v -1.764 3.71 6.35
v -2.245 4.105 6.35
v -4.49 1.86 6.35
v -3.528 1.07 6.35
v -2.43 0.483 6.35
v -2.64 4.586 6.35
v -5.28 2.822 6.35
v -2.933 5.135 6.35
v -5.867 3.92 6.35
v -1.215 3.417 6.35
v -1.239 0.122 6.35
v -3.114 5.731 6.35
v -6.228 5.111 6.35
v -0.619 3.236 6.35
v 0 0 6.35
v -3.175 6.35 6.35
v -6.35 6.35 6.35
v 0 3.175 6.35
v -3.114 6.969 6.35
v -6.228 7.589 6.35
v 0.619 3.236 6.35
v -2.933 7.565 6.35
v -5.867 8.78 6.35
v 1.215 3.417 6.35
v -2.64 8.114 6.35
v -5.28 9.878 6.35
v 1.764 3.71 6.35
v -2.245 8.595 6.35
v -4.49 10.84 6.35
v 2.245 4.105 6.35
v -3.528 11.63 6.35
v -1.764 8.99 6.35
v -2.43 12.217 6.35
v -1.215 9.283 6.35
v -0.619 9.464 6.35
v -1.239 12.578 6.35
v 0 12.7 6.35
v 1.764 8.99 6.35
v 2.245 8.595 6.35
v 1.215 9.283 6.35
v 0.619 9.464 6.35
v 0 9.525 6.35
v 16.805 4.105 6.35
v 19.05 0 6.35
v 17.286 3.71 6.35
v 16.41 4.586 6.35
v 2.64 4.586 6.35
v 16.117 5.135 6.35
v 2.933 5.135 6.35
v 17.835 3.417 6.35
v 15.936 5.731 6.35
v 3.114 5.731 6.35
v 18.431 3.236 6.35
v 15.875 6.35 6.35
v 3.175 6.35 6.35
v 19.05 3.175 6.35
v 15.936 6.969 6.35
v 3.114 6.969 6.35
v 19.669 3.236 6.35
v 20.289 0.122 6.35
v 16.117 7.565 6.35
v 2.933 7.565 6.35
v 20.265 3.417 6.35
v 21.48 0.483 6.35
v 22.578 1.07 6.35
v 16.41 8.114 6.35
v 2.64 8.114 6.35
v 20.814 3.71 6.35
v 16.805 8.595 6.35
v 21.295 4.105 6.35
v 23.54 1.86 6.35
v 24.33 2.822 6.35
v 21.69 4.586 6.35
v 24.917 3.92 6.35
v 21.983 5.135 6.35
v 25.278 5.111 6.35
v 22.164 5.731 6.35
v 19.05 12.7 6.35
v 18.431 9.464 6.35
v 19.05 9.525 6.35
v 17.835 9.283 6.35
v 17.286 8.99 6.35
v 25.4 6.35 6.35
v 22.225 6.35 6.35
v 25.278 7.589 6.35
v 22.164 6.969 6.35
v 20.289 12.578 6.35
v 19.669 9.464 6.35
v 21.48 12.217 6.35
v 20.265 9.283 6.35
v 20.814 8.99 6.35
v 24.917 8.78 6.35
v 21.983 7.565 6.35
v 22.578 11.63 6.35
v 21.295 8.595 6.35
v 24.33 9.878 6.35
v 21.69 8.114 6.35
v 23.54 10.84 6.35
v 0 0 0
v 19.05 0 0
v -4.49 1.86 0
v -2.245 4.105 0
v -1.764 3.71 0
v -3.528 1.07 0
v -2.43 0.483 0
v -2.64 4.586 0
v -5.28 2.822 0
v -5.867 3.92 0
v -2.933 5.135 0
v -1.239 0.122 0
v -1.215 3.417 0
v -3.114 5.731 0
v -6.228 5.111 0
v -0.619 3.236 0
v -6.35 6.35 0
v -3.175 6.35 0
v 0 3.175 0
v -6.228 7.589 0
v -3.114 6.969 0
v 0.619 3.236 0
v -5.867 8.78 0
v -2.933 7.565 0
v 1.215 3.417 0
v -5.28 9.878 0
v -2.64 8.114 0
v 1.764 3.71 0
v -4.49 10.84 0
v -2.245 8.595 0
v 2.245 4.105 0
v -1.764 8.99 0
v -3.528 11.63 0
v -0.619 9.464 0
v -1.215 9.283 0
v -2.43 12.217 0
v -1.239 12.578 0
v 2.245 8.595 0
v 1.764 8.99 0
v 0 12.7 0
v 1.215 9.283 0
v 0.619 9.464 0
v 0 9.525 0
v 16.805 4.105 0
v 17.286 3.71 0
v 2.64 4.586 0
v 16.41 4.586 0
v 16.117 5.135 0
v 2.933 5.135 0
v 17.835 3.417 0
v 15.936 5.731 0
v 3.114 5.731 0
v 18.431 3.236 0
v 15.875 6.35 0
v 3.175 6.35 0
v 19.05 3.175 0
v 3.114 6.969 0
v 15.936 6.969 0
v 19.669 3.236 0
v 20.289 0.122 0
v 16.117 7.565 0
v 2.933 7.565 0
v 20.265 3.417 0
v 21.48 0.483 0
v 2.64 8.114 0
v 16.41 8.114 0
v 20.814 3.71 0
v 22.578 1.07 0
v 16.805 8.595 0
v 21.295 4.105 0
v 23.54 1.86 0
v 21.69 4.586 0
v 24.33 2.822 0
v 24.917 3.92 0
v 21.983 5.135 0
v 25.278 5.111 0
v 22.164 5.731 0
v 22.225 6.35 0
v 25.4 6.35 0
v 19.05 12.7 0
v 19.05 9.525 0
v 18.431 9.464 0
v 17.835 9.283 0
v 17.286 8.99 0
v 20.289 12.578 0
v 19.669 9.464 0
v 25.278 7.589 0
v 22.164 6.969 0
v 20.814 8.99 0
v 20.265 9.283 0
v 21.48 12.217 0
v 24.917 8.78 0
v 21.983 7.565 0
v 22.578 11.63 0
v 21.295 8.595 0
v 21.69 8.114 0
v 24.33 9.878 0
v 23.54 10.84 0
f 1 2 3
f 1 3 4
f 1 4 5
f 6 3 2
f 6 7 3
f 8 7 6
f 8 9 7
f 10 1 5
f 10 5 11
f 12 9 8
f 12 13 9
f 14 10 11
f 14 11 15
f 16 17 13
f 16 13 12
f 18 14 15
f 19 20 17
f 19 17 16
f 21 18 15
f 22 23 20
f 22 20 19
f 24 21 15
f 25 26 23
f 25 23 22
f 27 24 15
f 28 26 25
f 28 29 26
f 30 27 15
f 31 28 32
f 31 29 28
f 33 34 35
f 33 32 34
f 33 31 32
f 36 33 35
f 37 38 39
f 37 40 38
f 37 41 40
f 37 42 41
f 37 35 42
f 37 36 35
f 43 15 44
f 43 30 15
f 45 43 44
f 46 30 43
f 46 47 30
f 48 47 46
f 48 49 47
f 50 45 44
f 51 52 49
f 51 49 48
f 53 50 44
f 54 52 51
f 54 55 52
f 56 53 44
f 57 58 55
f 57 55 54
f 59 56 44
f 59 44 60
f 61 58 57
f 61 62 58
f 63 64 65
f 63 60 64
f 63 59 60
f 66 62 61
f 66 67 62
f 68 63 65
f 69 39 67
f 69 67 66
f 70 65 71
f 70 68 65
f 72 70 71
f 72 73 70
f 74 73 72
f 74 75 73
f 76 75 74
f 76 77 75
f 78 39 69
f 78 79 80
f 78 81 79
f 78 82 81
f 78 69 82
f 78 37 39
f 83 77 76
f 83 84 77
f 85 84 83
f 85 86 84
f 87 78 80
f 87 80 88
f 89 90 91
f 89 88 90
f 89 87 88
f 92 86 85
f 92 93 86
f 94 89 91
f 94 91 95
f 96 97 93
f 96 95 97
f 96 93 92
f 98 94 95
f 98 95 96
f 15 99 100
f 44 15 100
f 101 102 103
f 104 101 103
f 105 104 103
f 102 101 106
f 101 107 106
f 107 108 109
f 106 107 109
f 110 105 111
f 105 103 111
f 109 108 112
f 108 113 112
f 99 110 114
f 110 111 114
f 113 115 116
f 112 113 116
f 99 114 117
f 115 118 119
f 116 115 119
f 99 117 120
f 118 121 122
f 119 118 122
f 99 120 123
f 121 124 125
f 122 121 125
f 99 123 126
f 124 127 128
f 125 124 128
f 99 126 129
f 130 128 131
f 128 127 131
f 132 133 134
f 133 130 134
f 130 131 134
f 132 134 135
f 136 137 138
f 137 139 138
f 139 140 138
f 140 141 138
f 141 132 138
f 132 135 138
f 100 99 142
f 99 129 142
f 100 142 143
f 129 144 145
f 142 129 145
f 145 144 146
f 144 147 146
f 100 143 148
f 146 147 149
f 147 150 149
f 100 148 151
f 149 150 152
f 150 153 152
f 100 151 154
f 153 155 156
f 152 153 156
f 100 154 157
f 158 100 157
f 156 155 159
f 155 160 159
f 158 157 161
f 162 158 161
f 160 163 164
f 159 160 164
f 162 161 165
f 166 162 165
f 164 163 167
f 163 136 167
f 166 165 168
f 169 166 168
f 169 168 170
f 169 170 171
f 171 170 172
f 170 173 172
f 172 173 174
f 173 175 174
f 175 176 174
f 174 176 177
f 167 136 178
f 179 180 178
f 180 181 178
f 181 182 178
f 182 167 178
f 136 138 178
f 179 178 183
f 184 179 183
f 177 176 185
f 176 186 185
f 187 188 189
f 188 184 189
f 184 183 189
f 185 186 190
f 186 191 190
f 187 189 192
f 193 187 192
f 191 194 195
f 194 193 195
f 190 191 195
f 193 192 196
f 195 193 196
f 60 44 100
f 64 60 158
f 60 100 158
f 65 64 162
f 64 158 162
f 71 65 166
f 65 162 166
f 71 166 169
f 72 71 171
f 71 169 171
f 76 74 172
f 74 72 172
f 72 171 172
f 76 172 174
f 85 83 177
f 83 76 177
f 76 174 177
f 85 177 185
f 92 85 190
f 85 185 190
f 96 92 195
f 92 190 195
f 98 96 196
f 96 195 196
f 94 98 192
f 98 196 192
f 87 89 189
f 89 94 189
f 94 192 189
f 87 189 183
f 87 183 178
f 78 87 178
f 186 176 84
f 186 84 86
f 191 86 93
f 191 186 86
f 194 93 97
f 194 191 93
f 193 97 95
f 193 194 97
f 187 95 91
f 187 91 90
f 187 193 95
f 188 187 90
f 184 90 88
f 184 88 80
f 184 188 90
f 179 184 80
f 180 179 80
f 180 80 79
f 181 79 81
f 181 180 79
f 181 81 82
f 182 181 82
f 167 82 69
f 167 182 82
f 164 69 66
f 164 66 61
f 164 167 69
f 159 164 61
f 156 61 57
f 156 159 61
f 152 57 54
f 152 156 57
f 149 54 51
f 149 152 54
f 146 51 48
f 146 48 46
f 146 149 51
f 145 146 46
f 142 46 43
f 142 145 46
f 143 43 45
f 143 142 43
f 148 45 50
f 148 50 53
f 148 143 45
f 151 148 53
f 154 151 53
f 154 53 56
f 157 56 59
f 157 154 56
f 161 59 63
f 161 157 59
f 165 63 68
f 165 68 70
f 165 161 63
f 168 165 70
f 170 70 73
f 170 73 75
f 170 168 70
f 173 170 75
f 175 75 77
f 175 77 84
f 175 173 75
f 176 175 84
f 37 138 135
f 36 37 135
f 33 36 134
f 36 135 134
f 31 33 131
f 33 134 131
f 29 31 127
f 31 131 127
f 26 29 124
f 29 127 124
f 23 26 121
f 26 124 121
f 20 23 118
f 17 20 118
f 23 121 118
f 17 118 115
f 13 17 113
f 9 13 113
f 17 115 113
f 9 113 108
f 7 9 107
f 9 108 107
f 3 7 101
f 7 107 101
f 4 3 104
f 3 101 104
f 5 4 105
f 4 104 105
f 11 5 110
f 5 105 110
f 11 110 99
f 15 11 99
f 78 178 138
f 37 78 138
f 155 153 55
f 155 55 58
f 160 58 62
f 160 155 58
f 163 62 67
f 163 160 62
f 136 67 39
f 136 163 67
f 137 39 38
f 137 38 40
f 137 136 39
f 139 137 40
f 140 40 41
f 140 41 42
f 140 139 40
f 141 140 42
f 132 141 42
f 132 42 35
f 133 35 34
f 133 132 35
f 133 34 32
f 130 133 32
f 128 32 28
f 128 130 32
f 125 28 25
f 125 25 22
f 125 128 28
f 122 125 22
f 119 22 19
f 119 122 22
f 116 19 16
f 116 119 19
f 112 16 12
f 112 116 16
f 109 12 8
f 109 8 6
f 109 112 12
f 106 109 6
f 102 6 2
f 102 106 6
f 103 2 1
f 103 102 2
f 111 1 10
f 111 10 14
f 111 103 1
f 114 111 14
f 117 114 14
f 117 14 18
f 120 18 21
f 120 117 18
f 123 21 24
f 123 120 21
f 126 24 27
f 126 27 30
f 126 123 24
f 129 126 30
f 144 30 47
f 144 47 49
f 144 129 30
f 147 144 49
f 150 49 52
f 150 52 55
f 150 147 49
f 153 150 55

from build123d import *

# Parameters (mm, degrees)
SKETCH1_R           = 3.175
EXTRUSION2_DEPTH    = 6.35
SKETCH1_3_R         = 6.35
BOSS_EXTRUDE1_DEPTH = 6.35
SKETCH1_4_R         = 3.175
CUT_EXTRUDE1_DEPTH  = 6.35


with BuildPart() as part:
    # Sketch1 → Extrusion2 (new body)
    with BuildSketch(Plane.XY):
        with BuildLine():
            Line((0, 0), (19.05, 0))
            ThreePointArc((19.05, 0), (12.7, 6.35), (19.05, 12.7))
            Line((19.05, 12.7), (0, 12.7))
            ThreePointArc((0, 12.7), (-6.35, 6.35), (0, 0))
        make_face()
        with Locations((0, 6.35)):
            Circle(SKETCH1_R, mode=Mode.SUBTRACT)
    extrude(amount=EXTRUSION2_DEPTH)

    # Sketch1<3> → Boss-Extrude1 (add)
    with BuildSketch(Plane.XY):
        with Locations((19.05, 6.35)):
            Circle(SKETCH1_3_R)
    extrude(amount=BOSS_EXTRUDE1_DEPTH)

    # Sketch1<4> → Cut-Extrude1 (cut)
    with BuildSketch(Plane.XY):
        with Locations((19.05, 6.35)):
            Circle(SKETCH1_4_R)
    extrude(amount=CUT_EXTRUDE1_DEPTH, mode=Mode.SUBTRACT)


solid = part.part
